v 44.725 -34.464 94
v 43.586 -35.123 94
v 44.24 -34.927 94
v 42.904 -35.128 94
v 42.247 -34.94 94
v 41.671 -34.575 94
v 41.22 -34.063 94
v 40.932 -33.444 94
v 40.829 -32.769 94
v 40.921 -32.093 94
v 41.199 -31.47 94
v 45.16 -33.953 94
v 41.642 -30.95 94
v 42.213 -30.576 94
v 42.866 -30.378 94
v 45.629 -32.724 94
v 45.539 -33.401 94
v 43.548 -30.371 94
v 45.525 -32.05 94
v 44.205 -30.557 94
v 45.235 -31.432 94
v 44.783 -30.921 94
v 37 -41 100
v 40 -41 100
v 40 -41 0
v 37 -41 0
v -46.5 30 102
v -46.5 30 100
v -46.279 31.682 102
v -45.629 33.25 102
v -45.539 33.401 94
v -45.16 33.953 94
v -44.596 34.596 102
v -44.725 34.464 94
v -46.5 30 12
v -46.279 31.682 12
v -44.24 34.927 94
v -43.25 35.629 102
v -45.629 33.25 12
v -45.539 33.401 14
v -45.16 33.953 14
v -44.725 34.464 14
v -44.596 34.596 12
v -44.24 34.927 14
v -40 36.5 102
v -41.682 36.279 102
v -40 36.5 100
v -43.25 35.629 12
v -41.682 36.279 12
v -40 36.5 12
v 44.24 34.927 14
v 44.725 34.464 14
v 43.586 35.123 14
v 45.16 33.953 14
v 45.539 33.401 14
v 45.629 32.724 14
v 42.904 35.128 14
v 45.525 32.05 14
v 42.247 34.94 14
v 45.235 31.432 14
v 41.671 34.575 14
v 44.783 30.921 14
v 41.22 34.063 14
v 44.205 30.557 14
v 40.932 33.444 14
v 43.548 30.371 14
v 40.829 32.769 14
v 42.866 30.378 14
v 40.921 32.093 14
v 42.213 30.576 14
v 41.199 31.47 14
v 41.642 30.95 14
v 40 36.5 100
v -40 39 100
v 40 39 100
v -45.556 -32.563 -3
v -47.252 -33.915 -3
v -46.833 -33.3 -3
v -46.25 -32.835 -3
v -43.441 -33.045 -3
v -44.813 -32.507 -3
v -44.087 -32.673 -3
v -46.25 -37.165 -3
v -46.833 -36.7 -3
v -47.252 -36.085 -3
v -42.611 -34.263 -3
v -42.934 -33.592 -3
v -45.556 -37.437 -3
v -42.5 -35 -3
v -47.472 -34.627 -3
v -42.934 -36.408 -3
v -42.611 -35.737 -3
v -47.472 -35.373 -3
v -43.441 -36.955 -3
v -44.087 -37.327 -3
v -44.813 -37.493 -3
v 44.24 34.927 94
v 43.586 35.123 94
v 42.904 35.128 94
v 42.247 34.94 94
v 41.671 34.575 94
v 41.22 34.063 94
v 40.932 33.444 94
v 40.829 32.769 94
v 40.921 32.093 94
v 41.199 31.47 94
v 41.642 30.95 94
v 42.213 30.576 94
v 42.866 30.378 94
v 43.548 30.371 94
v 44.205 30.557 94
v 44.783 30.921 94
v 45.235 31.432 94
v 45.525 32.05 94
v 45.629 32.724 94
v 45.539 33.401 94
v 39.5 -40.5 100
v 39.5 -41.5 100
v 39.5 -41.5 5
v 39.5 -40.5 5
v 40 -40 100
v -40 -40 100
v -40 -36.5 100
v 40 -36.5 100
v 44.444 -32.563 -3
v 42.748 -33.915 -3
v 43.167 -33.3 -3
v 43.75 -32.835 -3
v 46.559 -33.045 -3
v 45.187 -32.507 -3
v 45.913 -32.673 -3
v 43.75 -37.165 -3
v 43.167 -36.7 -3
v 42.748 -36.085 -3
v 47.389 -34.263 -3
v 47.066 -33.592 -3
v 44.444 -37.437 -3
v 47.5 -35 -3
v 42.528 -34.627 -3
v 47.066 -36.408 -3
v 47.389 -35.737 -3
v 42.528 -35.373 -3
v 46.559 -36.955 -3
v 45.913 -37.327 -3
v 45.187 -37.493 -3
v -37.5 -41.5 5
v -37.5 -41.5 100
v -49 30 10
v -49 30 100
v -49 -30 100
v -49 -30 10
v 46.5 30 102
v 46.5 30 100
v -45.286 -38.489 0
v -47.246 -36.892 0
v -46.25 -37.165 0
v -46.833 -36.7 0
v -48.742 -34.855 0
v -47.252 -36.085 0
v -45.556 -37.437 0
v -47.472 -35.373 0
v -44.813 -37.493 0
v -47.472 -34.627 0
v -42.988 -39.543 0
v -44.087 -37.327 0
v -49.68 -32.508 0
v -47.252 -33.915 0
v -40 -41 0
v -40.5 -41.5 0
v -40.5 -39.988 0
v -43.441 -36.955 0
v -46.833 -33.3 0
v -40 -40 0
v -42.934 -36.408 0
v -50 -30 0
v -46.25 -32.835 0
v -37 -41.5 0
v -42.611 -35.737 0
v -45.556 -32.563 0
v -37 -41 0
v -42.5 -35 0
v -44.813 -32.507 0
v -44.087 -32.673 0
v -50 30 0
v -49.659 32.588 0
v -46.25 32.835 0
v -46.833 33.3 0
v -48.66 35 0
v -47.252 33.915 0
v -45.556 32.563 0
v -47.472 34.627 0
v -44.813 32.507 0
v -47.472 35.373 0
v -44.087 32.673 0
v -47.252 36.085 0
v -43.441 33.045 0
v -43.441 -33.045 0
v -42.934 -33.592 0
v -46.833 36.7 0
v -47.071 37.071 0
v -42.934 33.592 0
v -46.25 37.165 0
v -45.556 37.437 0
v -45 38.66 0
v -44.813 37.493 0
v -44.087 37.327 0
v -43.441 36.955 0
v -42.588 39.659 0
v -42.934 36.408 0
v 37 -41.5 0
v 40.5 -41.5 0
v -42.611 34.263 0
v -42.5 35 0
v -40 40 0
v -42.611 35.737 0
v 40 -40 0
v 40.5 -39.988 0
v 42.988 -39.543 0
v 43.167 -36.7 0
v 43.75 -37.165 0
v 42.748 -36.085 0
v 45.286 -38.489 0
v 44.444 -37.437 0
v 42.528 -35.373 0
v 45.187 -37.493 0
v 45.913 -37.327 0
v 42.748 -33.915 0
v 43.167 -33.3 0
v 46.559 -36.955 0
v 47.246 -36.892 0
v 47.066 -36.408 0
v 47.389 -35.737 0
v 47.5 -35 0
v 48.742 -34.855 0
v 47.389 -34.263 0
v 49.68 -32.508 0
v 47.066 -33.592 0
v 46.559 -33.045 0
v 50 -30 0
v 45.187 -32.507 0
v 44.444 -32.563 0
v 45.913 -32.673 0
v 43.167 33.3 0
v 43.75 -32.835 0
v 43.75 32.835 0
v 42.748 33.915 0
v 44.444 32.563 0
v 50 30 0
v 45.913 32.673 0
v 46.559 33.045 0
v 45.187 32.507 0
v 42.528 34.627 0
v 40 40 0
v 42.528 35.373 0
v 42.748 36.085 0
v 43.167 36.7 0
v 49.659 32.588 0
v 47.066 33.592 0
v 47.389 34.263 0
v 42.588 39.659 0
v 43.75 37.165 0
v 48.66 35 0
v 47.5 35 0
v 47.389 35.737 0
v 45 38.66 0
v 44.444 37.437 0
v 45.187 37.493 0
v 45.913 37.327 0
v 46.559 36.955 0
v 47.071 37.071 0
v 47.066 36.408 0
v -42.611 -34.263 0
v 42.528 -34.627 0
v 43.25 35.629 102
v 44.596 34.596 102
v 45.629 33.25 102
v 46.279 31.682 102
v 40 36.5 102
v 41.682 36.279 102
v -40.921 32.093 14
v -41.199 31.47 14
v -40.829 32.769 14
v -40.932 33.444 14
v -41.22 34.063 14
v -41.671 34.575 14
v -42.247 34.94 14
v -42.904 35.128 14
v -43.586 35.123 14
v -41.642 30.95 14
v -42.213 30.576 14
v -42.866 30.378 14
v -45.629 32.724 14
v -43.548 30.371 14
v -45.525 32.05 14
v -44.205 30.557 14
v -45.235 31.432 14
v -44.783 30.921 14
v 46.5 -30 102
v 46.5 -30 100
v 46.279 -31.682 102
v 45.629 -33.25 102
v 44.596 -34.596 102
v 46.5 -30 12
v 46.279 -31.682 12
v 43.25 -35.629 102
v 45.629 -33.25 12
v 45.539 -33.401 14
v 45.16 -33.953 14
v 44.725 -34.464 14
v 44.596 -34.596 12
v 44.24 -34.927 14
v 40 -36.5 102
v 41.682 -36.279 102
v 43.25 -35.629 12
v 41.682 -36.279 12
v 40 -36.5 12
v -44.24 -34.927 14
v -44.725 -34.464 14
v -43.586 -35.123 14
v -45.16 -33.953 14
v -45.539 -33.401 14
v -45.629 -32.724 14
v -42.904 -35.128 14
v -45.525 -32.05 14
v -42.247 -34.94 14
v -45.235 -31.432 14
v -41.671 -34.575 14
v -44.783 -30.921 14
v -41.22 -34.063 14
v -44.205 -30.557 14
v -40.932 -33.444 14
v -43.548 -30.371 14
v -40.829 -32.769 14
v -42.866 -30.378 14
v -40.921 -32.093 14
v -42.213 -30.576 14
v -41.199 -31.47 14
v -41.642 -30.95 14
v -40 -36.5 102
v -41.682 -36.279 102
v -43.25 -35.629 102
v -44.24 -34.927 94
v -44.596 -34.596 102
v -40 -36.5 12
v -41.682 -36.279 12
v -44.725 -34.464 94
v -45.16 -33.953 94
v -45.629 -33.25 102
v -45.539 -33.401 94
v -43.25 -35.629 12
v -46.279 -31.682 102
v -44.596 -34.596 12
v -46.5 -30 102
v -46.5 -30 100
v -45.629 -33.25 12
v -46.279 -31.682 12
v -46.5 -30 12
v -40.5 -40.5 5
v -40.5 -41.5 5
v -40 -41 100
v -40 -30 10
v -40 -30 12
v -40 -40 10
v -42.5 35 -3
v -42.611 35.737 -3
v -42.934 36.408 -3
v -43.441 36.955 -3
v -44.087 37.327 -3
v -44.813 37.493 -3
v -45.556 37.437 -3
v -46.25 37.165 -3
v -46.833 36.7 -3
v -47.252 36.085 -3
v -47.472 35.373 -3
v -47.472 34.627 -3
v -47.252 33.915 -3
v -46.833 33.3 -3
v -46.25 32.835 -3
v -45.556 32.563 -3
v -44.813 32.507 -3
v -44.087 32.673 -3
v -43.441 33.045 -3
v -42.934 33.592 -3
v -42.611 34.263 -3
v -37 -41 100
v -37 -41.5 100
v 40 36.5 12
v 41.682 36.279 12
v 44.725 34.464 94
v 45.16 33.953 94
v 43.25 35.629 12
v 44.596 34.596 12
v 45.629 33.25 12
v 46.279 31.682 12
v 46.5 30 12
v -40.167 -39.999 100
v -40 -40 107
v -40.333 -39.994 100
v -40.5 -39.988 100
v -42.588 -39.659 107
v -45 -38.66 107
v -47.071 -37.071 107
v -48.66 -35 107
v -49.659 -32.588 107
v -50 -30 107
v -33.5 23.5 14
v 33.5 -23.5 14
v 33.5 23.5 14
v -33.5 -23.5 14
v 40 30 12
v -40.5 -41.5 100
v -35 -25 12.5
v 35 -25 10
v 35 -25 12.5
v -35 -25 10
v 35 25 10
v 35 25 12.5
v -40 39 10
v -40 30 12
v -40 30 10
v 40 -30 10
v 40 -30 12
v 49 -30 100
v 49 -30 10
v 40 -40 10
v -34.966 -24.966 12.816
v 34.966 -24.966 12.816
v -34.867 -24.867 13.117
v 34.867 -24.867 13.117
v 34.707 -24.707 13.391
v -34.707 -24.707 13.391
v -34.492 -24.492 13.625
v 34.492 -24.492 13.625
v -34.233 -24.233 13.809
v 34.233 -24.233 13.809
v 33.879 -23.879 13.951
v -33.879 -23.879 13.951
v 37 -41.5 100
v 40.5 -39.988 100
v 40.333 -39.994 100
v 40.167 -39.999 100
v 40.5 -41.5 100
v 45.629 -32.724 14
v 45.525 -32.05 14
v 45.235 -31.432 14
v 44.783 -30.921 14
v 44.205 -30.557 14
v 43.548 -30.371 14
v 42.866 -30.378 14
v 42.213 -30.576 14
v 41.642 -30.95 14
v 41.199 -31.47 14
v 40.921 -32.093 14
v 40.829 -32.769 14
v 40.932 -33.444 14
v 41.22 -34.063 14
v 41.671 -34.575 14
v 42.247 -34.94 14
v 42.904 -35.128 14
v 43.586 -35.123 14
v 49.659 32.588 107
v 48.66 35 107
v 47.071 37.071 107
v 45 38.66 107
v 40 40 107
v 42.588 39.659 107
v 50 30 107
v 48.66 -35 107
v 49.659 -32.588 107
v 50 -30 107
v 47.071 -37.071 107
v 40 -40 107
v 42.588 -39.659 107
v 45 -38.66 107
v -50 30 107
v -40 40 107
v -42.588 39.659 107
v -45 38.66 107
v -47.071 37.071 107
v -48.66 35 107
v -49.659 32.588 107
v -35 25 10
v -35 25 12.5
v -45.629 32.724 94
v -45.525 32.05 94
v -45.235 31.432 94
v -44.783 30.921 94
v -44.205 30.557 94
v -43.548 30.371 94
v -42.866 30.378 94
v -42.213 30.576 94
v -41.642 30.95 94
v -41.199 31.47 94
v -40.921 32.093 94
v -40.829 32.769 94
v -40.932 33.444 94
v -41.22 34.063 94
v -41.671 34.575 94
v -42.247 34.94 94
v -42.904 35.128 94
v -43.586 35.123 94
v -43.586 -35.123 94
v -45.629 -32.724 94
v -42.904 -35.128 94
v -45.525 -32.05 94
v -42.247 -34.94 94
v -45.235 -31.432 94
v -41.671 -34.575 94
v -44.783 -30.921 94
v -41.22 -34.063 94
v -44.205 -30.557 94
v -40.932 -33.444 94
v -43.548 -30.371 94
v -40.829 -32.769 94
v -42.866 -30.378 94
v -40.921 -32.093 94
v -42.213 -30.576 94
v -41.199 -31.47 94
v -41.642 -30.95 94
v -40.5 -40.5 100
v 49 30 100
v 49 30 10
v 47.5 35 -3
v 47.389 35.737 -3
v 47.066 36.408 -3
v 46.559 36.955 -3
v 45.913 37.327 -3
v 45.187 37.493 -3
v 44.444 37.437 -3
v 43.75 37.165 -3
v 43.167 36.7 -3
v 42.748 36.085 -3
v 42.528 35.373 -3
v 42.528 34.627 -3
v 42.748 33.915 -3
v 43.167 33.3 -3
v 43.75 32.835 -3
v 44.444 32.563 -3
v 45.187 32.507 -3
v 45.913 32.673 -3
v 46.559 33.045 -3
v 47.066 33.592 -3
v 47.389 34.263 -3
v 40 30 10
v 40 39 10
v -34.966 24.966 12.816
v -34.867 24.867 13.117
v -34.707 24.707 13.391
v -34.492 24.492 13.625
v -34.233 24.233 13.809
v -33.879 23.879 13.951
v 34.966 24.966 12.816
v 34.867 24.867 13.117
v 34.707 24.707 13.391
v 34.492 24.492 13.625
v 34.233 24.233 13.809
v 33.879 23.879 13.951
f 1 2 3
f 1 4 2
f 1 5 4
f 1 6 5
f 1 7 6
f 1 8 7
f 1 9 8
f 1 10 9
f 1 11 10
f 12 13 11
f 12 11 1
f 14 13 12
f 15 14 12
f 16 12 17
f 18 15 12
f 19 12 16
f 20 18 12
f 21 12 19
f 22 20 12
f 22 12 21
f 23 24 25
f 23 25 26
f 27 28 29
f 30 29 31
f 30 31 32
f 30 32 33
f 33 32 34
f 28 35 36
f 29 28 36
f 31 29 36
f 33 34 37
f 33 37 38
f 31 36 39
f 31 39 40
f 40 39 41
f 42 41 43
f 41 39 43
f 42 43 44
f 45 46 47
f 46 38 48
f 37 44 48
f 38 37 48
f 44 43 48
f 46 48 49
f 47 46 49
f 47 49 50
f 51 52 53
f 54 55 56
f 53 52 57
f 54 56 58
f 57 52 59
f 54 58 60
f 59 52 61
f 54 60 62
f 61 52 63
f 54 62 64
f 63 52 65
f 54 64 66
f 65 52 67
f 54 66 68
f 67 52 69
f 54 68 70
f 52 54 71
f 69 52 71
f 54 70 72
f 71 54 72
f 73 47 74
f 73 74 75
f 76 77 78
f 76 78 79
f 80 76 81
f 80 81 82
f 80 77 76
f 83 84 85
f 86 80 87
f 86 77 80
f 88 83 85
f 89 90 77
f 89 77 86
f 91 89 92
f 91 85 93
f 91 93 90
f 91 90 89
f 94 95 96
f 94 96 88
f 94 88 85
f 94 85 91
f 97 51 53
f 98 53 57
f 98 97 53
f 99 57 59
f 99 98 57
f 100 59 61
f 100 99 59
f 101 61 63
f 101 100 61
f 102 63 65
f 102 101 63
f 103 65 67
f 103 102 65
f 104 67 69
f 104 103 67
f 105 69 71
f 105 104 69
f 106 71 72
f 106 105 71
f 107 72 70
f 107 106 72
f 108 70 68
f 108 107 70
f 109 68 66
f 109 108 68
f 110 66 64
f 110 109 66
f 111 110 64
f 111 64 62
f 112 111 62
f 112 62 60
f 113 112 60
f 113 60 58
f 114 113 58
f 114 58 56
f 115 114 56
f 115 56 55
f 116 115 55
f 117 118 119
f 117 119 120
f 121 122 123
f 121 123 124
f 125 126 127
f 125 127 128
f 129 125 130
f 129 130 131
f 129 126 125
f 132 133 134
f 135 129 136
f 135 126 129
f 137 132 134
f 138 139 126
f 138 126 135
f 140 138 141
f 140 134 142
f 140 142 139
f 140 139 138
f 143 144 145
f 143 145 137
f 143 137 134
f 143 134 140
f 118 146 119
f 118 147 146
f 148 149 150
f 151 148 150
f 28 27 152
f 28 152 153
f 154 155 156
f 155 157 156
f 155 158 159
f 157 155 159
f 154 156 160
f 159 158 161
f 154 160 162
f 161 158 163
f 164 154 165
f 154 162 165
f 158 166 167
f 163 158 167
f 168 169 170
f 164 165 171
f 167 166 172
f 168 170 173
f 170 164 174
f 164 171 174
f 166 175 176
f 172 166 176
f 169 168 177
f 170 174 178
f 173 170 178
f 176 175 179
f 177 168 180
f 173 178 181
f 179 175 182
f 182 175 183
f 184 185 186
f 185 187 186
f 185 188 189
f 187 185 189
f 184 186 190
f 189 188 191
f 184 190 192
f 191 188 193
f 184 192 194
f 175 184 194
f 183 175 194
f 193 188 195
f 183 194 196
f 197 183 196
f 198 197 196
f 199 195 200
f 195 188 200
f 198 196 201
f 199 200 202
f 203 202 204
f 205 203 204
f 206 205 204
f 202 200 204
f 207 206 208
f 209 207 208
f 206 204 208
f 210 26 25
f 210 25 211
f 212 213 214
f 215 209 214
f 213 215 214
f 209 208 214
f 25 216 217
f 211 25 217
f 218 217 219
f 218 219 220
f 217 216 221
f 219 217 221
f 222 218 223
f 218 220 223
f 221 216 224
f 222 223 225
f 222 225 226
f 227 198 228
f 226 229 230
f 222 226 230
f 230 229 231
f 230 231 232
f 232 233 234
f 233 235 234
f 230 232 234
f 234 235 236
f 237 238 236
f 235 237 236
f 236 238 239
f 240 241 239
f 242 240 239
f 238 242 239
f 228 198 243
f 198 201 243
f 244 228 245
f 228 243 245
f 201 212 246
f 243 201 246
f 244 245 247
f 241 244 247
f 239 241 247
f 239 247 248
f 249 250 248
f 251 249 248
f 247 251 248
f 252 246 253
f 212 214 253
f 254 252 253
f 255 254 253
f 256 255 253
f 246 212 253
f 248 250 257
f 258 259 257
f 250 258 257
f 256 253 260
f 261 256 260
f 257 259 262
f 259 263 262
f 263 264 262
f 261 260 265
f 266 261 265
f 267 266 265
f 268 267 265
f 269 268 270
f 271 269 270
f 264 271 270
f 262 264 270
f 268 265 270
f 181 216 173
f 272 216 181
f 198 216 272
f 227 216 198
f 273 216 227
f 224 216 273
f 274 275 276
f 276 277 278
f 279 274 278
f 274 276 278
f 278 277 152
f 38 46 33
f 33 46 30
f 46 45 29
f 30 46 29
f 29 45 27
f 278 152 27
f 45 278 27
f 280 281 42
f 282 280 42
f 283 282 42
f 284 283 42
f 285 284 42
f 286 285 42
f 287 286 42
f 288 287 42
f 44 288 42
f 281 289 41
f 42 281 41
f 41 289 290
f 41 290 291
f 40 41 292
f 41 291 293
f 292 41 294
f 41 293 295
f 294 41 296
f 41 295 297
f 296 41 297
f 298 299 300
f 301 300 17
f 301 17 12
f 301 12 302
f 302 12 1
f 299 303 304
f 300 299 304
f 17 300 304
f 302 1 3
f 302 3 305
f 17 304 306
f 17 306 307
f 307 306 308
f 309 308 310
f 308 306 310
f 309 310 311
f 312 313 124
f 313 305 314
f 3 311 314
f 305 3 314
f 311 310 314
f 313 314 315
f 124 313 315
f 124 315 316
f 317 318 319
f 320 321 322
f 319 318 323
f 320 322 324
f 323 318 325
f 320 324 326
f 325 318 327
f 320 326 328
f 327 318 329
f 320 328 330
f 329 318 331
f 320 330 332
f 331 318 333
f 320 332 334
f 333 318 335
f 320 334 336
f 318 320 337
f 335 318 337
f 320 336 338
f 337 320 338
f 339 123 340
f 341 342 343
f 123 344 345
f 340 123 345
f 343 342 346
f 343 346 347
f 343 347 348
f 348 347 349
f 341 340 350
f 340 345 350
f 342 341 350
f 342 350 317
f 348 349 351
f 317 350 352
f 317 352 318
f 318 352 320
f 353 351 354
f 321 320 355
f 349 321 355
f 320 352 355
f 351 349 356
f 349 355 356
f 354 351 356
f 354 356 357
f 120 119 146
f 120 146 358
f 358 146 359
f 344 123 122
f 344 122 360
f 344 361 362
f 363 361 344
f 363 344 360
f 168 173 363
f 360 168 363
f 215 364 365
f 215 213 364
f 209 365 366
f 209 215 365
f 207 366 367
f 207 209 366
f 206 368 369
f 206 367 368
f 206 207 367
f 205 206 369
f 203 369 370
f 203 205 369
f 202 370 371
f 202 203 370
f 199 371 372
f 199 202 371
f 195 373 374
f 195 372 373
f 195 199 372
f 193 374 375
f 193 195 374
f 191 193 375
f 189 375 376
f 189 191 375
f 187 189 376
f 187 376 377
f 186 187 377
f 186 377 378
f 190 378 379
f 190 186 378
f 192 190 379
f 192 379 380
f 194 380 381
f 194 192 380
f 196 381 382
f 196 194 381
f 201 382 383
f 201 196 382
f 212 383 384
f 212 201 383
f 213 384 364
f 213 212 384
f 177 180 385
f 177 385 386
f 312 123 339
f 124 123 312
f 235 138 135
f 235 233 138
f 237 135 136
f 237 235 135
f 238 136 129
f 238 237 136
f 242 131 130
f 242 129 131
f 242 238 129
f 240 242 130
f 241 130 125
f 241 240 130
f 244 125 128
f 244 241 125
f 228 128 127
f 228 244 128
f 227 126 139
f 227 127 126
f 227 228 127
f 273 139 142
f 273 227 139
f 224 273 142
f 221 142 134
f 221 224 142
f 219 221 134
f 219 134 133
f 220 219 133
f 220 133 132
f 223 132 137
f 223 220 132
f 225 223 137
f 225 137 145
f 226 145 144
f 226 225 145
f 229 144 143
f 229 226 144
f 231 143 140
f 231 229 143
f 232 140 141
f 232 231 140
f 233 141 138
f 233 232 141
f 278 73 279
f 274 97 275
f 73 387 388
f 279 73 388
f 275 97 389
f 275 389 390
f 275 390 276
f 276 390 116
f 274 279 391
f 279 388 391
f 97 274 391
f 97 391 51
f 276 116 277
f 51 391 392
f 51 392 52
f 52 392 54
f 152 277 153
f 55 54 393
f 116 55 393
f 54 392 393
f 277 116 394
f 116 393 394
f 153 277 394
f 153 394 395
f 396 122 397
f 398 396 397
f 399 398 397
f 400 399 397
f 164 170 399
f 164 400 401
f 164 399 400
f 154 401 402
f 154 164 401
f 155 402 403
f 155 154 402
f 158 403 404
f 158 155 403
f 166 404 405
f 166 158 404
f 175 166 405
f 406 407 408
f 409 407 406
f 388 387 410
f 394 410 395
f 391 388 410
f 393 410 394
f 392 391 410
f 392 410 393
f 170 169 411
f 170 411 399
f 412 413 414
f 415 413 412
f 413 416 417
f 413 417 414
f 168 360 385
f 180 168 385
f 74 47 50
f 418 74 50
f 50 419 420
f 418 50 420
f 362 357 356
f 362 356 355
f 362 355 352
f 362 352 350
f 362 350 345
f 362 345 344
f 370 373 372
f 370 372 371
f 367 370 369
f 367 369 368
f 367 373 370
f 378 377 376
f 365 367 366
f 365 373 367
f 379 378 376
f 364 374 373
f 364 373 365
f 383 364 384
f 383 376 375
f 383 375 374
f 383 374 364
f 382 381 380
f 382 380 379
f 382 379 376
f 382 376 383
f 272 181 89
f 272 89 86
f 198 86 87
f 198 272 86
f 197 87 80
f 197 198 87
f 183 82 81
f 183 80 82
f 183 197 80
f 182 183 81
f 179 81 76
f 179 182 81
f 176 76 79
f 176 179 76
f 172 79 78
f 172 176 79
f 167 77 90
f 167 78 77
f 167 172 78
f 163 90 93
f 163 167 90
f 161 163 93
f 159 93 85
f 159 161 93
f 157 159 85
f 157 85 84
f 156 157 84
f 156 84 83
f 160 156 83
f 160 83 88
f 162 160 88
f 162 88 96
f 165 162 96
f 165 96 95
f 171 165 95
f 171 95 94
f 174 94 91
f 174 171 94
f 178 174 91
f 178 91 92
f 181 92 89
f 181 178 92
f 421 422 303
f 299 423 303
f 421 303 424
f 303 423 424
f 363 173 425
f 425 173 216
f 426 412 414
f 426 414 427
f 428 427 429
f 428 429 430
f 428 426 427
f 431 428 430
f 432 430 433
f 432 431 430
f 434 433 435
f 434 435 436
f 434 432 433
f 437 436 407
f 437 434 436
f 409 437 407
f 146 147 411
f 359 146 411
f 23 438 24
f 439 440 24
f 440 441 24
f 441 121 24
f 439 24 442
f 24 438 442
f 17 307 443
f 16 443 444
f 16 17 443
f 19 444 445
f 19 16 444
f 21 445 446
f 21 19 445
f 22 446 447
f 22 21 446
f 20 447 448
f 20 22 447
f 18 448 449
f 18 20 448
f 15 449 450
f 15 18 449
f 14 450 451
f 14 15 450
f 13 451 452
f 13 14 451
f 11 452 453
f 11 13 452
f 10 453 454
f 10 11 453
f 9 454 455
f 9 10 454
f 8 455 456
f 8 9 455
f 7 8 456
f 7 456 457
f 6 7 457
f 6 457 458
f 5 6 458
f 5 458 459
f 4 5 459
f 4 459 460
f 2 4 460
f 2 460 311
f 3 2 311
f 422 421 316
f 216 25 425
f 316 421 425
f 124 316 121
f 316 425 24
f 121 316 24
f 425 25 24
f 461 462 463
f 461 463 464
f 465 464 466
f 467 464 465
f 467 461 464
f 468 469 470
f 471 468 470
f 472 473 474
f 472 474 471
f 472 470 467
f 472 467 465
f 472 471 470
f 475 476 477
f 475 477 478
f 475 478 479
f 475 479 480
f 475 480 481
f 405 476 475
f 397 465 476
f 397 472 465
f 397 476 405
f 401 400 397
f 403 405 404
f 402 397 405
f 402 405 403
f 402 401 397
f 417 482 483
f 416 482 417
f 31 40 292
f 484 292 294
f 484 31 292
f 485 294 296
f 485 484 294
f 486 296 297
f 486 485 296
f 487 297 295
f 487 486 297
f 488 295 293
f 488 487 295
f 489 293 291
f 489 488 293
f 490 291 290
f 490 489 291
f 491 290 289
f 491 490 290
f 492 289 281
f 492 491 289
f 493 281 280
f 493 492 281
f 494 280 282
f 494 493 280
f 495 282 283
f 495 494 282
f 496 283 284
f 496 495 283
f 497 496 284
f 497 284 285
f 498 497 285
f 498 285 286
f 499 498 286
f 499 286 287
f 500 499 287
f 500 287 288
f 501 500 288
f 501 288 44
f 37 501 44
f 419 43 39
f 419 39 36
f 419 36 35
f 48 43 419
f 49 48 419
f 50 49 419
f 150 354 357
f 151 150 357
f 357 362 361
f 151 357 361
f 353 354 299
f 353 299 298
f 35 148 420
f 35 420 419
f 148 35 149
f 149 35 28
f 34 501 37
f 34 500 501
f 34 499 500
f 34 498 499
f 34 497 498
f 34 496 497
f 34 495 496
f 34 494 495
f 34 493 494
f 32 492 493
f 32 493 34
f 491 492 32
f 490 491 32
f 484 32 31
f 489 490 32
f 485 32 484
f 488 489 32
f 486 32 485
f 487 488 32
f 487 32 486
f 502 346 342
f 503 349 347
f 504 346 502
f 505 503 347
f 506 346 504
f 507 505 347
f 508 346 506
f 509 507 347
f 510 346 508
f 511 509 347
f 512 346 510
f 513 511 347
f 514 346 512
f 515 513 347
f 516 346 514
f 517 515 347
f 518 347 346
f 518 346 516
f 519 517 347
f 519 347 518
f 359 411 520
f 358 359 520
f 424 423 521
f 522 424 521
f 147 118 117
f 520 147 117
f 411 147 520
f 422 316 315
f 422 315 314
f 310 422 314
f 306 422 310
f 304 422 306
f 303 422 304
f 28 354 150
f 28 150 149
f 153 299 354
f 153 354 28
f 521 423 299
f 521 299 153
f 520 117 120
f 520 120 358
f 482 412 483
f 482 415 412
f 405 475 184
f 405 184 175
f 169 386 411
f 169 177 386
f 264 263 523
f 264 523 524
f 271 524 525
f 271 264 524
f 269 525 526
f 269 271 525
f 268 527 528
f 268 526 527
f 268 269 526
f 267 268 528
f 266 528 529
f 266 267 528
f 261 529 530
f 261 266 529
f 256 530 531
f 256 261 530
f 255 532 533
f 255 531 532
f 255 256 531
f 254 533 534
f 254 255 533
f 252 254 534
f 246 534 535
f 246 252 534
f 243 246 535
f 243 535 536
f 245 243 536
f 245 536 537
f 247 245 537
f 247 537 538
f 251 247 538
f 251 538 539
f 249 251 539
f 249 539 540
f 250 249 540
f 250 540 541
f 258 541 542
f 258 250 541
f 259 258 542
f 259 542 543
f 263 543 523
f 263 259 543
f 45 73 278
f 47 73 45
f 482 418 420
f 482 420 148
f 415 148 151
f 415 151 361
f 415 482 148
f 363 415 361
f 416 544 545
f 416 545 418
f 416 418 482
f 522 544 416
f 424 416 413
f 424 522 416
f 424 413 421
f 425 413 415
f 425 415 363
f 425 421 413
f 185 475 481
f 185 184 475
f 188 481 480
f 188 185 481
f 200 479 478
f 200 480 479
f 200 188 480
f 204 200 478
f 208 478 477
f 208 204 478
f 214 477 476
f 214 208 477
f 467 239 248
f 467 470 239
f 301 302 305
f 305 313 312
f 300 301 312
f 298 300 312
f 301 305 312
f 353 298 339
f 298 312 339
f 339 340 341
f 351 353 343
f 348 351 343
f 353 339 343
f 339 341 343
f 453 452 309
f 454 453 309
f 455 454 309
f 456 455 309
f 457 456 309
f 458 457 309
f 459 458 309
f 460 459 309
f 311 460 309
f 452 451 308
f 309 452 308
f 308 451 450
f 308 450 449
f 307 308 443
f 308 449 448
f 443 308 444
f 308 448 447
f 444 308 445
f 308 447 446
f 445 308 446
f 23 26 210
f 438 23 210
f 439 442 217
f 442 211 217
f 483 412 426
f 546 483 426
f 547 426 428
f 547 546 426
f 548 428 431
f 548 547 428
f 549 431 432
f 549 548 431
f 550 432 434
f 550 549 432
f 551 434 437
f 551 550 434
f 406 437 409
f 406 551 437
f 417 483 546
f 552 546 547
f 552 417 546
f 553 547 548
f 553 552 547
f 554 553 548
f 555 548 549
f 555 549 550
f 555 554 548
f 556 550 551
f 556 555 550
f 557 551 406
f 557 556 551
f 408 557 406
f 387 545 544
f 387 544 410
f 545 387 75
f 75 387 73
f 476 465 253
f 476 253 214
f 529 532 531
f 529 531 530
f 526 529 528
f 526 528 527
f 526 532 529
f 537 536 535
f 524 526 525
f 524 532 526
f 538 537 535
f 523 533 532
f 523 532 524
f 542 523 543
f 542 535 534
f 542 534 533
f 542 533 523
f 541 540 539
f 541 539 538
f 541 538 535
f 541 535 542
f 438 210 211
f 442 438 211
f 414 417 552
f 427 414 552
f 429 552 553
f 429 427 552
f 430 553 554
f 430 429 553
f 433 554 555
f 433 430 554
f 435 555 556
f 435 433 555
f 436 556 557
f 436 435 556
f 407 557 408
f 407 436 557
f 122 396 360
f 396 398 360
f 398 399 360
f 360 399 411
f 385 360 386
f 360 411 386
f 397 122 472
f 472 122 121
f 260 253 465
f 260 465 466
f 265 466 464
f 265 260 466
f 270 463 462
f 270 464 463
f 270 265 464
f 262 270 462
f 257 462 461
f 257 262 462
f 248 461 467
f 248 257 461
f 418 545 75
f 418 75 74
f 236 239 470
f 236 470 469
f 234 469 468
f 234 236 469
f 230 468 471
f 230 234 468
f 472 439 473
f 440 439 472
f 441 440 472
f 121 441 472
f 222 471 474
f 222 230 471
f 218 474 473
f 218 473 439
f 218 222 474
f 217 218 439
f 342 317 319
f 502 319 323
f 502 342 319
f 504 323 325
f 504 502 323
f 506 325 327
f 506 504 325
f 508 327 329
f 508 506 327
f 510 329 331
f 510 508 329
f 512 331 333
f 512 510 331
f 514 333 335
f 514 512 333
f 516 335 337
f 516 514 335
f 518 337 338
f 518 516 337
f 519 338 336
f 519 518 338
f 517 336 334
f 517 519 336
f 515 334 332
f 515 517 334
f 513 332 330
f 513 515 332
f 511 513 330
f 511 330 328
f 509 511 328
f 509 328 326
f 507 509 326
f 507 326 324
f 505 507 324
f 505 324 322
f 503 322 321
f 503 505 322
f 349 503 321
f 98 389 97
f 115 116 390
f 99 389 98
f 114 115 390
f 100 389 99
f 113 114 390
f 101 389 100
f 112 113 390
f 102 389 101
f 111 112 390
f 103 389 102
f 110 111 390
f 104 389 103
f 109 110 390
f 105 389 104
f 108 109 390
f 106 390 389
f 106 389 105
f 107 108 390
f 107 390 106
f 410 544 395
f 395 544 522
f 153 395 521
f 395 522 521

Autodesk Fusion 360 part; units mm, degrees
sketch "Sketch1" plane through (0, 0, 0) normal (0, 0, 1) x (1, 0, 0)
  line L0 (40, 40) -> (-40, 40)
  line L1 (-50, 30) -> (-50, -30)
  line L2 (-40, -40) -> (40, -40)
  line L3 (50, -30) -> (50, 30)
  line L4 (50, 40) -> (-50, -40) construction
  line L5 (-50, 40) -> (50, -40) construction
  arc A0 (-40, 40) -> (-50, 30) centre (-40, 30) ccw
  arc A1 (50, 30) -> (40, 40) centre (40, 30) ccw
  arc A2 (40, -40) -> (50, -30) centre (40, -30) ccw
  arc A3 (-50, -30) -> (-40, -40) centre (-40, -30) ccw
  dimension "d1" = 100
  dimension "d2" = 80
  dimension "d3" = 10
  dimension "d4" = 10
extrude "Extrude1" add sketch "Sketch1" along normal blind 12 makes body 1
sketch "Sketch2" plane through (0, 0, 12) normal (0, 0, 1) x (-1, 0, 0)
  arc A0 (50, 30) -> (40, 40) centre (40, 30) ccw
  line L0 (40, 40) -> (-40, 40)
  arc A1 (-40, 40) -> (-50, 30) centre (-40, 30) ccw
  line L1 (-50, 30) -> (-50, -30)
  arc A2 (-50, -30) -> (-40, -40) centre (-40, -30) ccw
  line L2 (-40, -40) -> (40, -40)
  arc A3 (40, -40) -> (50, -30) centre (40, -30) ccw
  line L3 (50, -30) -> (50, 30)
  line L4 (46.5, -30) -> (46.5, 30)
  arc A4 (46.5, 30) -> (40, 36.5) centre (40, 30) ccw
  line L5 (40, 36.5) -> (-40, 36.5)
  arc A5 (-40, 36.5) -> (-46.5, 30) centre (-40, 30) ccw
  line L6 (-46.5, 30) -> (-46.5, -30)
  arc A6 (-46.5, -30) -> (-40, -36.5) centre (-40, -30) ccw
  line L7 (-40, -36.5) -> (40, -36.5)
  arc A7 (40, -36.5) -> (46.5, -30) centre (40, -30) ccw
  dimension "d7" = -3.5
extrude "Extrude2" add sketch "Sketch2" along normal blind 95 bodies 1
sketch "Sketch3" plane through (50, 0, 0) normal (1, 0, 0) x (0, 1, 0)
  line L0 (-30, 0) -> (30, 0)
  line L1 (30, 0) -> (30, 107)
  line L2 (30, 107) -> (-30, 107)
  line L3 (-30, 107) -> (-30, 0)
  line L4 (-30, 100) -> (30, 100)
  line L5 (30, 100) -> (30, 10)
  line L6 (30, 10) -> (-30, 10)
  line L7 (-30, 10) -> (-30, 100)
  dimension "d10" = 60
  dimension "d11" = 90
extrude "Extrude3" cut sketch "Sketch3" against normal blind 170 contours L1 L3 L4 L5 L6 L7 bodies 1
sketch "Sketch4" plane through (0, -40, 0) normal (0, -1, 0) x (1, 0, 0)
  line L0 (-40, 0) -> (40, 0)
  line L1 (40, 0) -> (40, 107)
  line L2 (40, 107) -> (-40, 107)
  line L3 (-40, 107) -> (-40, 0)
  line L4 (-40, 100) -> (40, 100)
  line L5 (40, 100) -> (40, 10)
  line L6 (40, 10) -> (-40, 10)
  line L7 (-40, 10) -> (-40, 100)
  dimension "d14" = 80
  dimension "d15" = 90
extrude "Extrude4" cut sketch "Sketch4" against normal blind 135 contours L1 L3 L4 L5 L6 L7 bodies 1
sketch "Sketch5" plane through (0, 0, 10) normal (0, 0, 1) x (-1, 0, 0)
  line L0 (-40, 30) -> (-50, 30)
  line L1 (-50, 30) -> (-50, -30)
  line L2 (-50, -30) -> (-40, -30)
  line L3 (-40, -30) -> (-40, -40)
  line L4 (-40, -40) -> (40, -40)
  line L5 (40, -40) -> (40, -30)
  line L6 (40, -30) -> (50, -30)
  line L7 (50, -30) -> (50, 30)
  line L8 (50, 30) -> (40, 30)
  line L9 (40, 30) -> (40, 40)
  line L10 (40, 40) -> (-40, 40)
  line L11 (-40, 40) -> (-40, 30)
  line L12 (35, -25) -> (-35, -25)
  line L13 (-35, -25) -> (-35, 25)
  line L14 (-35, 25) -> (35, 25)
  line L15 (35, 25) -> (35, -25)
  dimension "d18" = 70
  dimension "d19" = 50
extrude "Extrude5" add sketch "Sketch5" along normal blind 4 contours L12 L13 L14 L15 bodies 1
fillet "Fillet1" radius 1.5 1 faces at (-11.6667, 8.3333, 14) on bodies 1
cylinder "CylinderPrimitive1" add diameter 4.8 height 80 placed x (1, 0, 0) y (0, 1, 0) z (0, 0, 1) at (43.2293, -32.75, 14) bodies 1
mirror "Mirror1" about plane through (0, 0, 0) normal (1, 0, 0) of "CylinderPrimitive1"
mirror "Mirror2" about plane through (0, 0, 0) normal (0, 1, 0) of "Mirror1", "CylinderPrimitive1"
sketch "Sketch7" plane through (50, 0, 0) normal (1, 0, 0) x (0, 1, 0)
  line L0 (-30, 100) -> (30, 100)
  line L1 (30, 100) -> (30, 107)
  line L2 (30, 107) -> (-30, 107)
  line L3 (-30, 107) -> (-30, 100)
  line L4 (-30, 100) -> (30, 100)
  line L5 (30, 100) -> (30, 10)
  line L6 (30, 10) -> (-30, 10)
  line L7 (-30, 10) -> (-30, 100)
sketch "Sketch8" plane through (0, 40, 0) normal (0, 1, 0) x (-1, 0, 0)
  line L0 (-40, 100) -> (40, 100)
  line L1 (40, 100) -> (40, 107)
  line L2 (40, 107) -> (-40, 107)
  line L3 (-40, 107) -> (-40, 100)
  line L4 (-40, 100) -> (40, 100)
  line L5 (40, 100) -> (40, 10)
  line L6 (40, 10) -> (-40, 10)
  line L7 (-40, 10) -> (-40, 100)
sketch "Sketch9" plane through (-50, 0, 0) normal (-1, 0, 0) x (0, -1, 0)
  line L0 (-30, 100) -> (30, 100)
  line L1 (30, 100) -> (30, 107)
  line L2 (30, 107) -> (-30, 107)
  line L3 (-30, 107) -> (-30, 100)
  line L4 (-30, 100) -> (30, 100)
  line L5 (30, 100) -> (30, 10)
  line L6 (30, 10) -> (-30, 10)
  line L7 (-30, 10) -> (-30, 100)
extrude "Extrude6" add sketch "Sketch9" against normal blind 1 contours L0 L4 L5 L6 L7 bodies 1
extrude "Extrude7" add sketch "Sketch8" against normal blind 1 contours L0 L4 L5 L6 L7 bodies 1
extrude "Extrude8" add sketch "Sketch7" against normal blind 1 contours L0 L4 L5 L6 L7 bodies 1
sketch "Sketch10" plane through (0, 0, 107) normal (0, 0, 1) x (-1, 0, 0)
  arc A0 (40, -36.5) -> (46.5, -30) centre (40, -30) ccw
  line L0 (40, -36.5) -> (-40, -36.5)
  arc A1 (-46.5, -30) -> (-40, -36.5) centre (-40, -30) ccw
  line L1 (-46.5, -30) -> (-46.5, 30)
  arc A2 (-40, 36.5) -> (-46.5, 30) centre (-40, 30) ccw
  line L2 (-40, 36.5) -> (40, 36.5)
  arc A3 (46.5, 30) -> (40, 36.5) centre (40, 30) ccw
  line L3 (46.5, 30) -> (46.5, -30)
  line L4 (50, -30) -> (50, 30)
  arc A4 (50, 30) -> (40, 40) centre (40, 30) ccw
  line L5 (40, 40) -> (-40, 40)
  arc A5 (-40, 40) -> (-50, 30) centre (-40, 30) ccw
  line L6 (-50, 30) -> (-50, -30)
  arc A6 (-50, -30) -> (-40, -40) centre (-40, -30) ccw
  line L7 (-40, -40) -> (40, -40)
  arc A7 (40, -40) -> (50, -30) centre (40, -30) ccw
  line L8 (49.0553, -30) -> (49.0553, 30)
  arc A8 (49.0553, 30) -> (40, 39.0553) centre (40, 30) ccw
  line L9 (40, 39.0553) -> (-40, 39.0553)
  arc A9 (-40, 39.0553) -> (-49.0553, 30) centre (-40, 30) ccw
  line L10 (-49.0553, 30) -> (-49.0553, -30)
  arc A10 (-49.0553, -30) -> (-40, -39.0553) centre (-40, -30) ccw
  line L11 (-40, -39.0553) -> (40, -39.0553)
  arc A11 (40, -39.0553) -> (49.0553, -30) centre (40, -30) ccw
  dimension "d36" = -0.9447
extrude "Extrude9" add sketch "Sketch10" against normal blind 5 contours A0 L0 A1 L1 A2 L2 A3 L3 bodies 1
sketch "Sketch11" plane through (-50, 0, 0) normal (-1, 0, 0) x (0, -1, 0)
  line L0 (30, 0) -> (30, 107)
  line L1 (30, 107) -> (-30, 107)
  line L2 (-30, 107) -> (-30, 0)
  line L3 (-30, 0) -> (30, 0)
  line L4 (-30, 100) -> (30, 100)
  line L5 (-30, 100) -> (-30, 107)
  line L6 (30, 107) -> (30, 100)
  line L7 (30, 107) -> (-30, 107)
extrude "Extrude10" add sketch "Sketch11" against normal blind 100 contours L0 L1 L2 L4 L5 L6 L7 bodies 1
sketch "Sketch12" plane through (0, 0, 0) normal (0, 0, -1) x (1, 0, 0)
  arc A0 (-40, 40) -> (-50, 30) centre (-40, 30) ccw
  line L0 (-50, 30) -> (-50, -30)
  arc A1 (-50, -30) -> (-40, -40) centre (-40, -30) ccw
  line L1 (-40, -40) -> (40, -40)
  arc A2 (40, -40) -> (50, -30) centre (40, -30) ccw
  line L2 (50, -30) -> (50, 30)
  arc A3 (50, 30) -> (40, 40) centre (40, 30) ccw
  line L3 (40, 40) -> (-40, 40)
  line L4 (-40, 40) -> (-40, 41)
  line L5 (-40, 41) -> (-37, 41)
  line L6 (-37, 41) -> (-37, 41.5)
  line L7 (-37, 41.5) -> (-40.5, 41.5)
  line L8 (-40.5, 41.5) -> (-40.5, 39.9875)
  line L9 (-40.5, 39.9875) -> (-40, 40)
  line L10 (0, 54) -> (0, 19) construction
  line L11 (37, 41.5) -> (40.5, 41.5)
  line L12 (40.5, 41.5) -> (40.5, 39.9875)
  line L13 (40, 40) -> (40, 41)
  line L14 (40, 41) -> (37, 41)
  line L15 (37, 41) -> (37, 41.5)
  line L16 (40.5, 39.9875) -> (40, 40)
extrude "Extrude11" add sketch "Sketch12" against normal blind 100 contours A0 L4 L5 L6 L7 L8 | A3 L11 L12 L13 L14 L15 bodies 1
sketch "Sketch13" plane through (0, 0, 100) normal (0, 0, 1) x (-1, 0, 0)
  line L0 (40, 41) -> (40, 40)
  arc A0 (40.5, 39.9875) -> (40, 40) centre (40, 30) ccw
  line L1 (40.5, 39.9875) -> (40.5, 41.5)
  line L2 (40.5, 41.5) -> (37, 41.5)
  line L3 (37, 41.5) -> (37, 41)
  line L4 (37, 41) -> (40, 41)
  line L5 (40, 41) -> (-40, 41)
  line L6 (-40, 41) -> (-40, 40)
  line L7 (-40, 40) -> (40, 40)
  line L8 (40, 40) -> (40, 41)
extrude "Extrude1'" add sketch "Sketch13" against normal blind 95 separate body contours L0 L4 L5 L6 L7 L8 makes body 2 in component "Component"
sketch "Sketch14" plane through (0, 0, 0) normal (0, 0, -1) x (1, 0, 0)
  arc A0 (-40.5, 39.9875) -> (-50, 30) centre (-40, 30) ccw
  line L0 (-50, 30) -> (-50, -30)
  arc A1 (-50, -30) -> (-40, -40) centre (-40, -30) ccw
  line L1 (-40, -40) -> (40, -40)
  arc A2 (40, -40) -> (50, -30) centre (40, -30) ccw
  line L2 (50, -30) -> (50, 30)
  arc A3 (50, 30) -> (40.5, 39.9875) centre (40, 30) ccw
  line L3 (40.5, 39.9875) -> (40.5, 41.5)
  line L4 (40.5, 41.5) -> (37, 41.5)
  line L5 (37, 41.5) -> (37, 41)
  line L6 (37, 41) -> (40, 41)
  line L7 (40, 41) -> (40, 40)
  line L8 (40, 40) -> (-40, 40)
  line L9 (-40, 40) -> (-40, 41)
  line L10 (-40, 41) -> (-37, 41)
  line L11 (-37, 41) -> (-37, 41.5)
  line L12 (-37, 41.5) -> (-40.5, 41.5)
  line L13 (-40.5, 41.5) -> (-40.5, 39.9875)
  circle A4 centre (-45, 35) radius 2.5
  circle A5 centre (45, 35) radius 2.5
  circle A6 centre (-45, -35) radius 2.5
  circle A7 centre (45, -35) radius 2.5
  dimension "d51" = 5
  dimension "d52" = 5
  dimension "d53" = 5
  dimension "d54" = 5
extrude "Extrude12" add sketch "Sketch14" along normal blind 3 contours A4 | A5 | A6 | A7 bodies 1
component "Component" placed x (1, 0, 0) y (0, 1, 0) z (0, 0, 1) at (-0.5, -0.5, 0)
